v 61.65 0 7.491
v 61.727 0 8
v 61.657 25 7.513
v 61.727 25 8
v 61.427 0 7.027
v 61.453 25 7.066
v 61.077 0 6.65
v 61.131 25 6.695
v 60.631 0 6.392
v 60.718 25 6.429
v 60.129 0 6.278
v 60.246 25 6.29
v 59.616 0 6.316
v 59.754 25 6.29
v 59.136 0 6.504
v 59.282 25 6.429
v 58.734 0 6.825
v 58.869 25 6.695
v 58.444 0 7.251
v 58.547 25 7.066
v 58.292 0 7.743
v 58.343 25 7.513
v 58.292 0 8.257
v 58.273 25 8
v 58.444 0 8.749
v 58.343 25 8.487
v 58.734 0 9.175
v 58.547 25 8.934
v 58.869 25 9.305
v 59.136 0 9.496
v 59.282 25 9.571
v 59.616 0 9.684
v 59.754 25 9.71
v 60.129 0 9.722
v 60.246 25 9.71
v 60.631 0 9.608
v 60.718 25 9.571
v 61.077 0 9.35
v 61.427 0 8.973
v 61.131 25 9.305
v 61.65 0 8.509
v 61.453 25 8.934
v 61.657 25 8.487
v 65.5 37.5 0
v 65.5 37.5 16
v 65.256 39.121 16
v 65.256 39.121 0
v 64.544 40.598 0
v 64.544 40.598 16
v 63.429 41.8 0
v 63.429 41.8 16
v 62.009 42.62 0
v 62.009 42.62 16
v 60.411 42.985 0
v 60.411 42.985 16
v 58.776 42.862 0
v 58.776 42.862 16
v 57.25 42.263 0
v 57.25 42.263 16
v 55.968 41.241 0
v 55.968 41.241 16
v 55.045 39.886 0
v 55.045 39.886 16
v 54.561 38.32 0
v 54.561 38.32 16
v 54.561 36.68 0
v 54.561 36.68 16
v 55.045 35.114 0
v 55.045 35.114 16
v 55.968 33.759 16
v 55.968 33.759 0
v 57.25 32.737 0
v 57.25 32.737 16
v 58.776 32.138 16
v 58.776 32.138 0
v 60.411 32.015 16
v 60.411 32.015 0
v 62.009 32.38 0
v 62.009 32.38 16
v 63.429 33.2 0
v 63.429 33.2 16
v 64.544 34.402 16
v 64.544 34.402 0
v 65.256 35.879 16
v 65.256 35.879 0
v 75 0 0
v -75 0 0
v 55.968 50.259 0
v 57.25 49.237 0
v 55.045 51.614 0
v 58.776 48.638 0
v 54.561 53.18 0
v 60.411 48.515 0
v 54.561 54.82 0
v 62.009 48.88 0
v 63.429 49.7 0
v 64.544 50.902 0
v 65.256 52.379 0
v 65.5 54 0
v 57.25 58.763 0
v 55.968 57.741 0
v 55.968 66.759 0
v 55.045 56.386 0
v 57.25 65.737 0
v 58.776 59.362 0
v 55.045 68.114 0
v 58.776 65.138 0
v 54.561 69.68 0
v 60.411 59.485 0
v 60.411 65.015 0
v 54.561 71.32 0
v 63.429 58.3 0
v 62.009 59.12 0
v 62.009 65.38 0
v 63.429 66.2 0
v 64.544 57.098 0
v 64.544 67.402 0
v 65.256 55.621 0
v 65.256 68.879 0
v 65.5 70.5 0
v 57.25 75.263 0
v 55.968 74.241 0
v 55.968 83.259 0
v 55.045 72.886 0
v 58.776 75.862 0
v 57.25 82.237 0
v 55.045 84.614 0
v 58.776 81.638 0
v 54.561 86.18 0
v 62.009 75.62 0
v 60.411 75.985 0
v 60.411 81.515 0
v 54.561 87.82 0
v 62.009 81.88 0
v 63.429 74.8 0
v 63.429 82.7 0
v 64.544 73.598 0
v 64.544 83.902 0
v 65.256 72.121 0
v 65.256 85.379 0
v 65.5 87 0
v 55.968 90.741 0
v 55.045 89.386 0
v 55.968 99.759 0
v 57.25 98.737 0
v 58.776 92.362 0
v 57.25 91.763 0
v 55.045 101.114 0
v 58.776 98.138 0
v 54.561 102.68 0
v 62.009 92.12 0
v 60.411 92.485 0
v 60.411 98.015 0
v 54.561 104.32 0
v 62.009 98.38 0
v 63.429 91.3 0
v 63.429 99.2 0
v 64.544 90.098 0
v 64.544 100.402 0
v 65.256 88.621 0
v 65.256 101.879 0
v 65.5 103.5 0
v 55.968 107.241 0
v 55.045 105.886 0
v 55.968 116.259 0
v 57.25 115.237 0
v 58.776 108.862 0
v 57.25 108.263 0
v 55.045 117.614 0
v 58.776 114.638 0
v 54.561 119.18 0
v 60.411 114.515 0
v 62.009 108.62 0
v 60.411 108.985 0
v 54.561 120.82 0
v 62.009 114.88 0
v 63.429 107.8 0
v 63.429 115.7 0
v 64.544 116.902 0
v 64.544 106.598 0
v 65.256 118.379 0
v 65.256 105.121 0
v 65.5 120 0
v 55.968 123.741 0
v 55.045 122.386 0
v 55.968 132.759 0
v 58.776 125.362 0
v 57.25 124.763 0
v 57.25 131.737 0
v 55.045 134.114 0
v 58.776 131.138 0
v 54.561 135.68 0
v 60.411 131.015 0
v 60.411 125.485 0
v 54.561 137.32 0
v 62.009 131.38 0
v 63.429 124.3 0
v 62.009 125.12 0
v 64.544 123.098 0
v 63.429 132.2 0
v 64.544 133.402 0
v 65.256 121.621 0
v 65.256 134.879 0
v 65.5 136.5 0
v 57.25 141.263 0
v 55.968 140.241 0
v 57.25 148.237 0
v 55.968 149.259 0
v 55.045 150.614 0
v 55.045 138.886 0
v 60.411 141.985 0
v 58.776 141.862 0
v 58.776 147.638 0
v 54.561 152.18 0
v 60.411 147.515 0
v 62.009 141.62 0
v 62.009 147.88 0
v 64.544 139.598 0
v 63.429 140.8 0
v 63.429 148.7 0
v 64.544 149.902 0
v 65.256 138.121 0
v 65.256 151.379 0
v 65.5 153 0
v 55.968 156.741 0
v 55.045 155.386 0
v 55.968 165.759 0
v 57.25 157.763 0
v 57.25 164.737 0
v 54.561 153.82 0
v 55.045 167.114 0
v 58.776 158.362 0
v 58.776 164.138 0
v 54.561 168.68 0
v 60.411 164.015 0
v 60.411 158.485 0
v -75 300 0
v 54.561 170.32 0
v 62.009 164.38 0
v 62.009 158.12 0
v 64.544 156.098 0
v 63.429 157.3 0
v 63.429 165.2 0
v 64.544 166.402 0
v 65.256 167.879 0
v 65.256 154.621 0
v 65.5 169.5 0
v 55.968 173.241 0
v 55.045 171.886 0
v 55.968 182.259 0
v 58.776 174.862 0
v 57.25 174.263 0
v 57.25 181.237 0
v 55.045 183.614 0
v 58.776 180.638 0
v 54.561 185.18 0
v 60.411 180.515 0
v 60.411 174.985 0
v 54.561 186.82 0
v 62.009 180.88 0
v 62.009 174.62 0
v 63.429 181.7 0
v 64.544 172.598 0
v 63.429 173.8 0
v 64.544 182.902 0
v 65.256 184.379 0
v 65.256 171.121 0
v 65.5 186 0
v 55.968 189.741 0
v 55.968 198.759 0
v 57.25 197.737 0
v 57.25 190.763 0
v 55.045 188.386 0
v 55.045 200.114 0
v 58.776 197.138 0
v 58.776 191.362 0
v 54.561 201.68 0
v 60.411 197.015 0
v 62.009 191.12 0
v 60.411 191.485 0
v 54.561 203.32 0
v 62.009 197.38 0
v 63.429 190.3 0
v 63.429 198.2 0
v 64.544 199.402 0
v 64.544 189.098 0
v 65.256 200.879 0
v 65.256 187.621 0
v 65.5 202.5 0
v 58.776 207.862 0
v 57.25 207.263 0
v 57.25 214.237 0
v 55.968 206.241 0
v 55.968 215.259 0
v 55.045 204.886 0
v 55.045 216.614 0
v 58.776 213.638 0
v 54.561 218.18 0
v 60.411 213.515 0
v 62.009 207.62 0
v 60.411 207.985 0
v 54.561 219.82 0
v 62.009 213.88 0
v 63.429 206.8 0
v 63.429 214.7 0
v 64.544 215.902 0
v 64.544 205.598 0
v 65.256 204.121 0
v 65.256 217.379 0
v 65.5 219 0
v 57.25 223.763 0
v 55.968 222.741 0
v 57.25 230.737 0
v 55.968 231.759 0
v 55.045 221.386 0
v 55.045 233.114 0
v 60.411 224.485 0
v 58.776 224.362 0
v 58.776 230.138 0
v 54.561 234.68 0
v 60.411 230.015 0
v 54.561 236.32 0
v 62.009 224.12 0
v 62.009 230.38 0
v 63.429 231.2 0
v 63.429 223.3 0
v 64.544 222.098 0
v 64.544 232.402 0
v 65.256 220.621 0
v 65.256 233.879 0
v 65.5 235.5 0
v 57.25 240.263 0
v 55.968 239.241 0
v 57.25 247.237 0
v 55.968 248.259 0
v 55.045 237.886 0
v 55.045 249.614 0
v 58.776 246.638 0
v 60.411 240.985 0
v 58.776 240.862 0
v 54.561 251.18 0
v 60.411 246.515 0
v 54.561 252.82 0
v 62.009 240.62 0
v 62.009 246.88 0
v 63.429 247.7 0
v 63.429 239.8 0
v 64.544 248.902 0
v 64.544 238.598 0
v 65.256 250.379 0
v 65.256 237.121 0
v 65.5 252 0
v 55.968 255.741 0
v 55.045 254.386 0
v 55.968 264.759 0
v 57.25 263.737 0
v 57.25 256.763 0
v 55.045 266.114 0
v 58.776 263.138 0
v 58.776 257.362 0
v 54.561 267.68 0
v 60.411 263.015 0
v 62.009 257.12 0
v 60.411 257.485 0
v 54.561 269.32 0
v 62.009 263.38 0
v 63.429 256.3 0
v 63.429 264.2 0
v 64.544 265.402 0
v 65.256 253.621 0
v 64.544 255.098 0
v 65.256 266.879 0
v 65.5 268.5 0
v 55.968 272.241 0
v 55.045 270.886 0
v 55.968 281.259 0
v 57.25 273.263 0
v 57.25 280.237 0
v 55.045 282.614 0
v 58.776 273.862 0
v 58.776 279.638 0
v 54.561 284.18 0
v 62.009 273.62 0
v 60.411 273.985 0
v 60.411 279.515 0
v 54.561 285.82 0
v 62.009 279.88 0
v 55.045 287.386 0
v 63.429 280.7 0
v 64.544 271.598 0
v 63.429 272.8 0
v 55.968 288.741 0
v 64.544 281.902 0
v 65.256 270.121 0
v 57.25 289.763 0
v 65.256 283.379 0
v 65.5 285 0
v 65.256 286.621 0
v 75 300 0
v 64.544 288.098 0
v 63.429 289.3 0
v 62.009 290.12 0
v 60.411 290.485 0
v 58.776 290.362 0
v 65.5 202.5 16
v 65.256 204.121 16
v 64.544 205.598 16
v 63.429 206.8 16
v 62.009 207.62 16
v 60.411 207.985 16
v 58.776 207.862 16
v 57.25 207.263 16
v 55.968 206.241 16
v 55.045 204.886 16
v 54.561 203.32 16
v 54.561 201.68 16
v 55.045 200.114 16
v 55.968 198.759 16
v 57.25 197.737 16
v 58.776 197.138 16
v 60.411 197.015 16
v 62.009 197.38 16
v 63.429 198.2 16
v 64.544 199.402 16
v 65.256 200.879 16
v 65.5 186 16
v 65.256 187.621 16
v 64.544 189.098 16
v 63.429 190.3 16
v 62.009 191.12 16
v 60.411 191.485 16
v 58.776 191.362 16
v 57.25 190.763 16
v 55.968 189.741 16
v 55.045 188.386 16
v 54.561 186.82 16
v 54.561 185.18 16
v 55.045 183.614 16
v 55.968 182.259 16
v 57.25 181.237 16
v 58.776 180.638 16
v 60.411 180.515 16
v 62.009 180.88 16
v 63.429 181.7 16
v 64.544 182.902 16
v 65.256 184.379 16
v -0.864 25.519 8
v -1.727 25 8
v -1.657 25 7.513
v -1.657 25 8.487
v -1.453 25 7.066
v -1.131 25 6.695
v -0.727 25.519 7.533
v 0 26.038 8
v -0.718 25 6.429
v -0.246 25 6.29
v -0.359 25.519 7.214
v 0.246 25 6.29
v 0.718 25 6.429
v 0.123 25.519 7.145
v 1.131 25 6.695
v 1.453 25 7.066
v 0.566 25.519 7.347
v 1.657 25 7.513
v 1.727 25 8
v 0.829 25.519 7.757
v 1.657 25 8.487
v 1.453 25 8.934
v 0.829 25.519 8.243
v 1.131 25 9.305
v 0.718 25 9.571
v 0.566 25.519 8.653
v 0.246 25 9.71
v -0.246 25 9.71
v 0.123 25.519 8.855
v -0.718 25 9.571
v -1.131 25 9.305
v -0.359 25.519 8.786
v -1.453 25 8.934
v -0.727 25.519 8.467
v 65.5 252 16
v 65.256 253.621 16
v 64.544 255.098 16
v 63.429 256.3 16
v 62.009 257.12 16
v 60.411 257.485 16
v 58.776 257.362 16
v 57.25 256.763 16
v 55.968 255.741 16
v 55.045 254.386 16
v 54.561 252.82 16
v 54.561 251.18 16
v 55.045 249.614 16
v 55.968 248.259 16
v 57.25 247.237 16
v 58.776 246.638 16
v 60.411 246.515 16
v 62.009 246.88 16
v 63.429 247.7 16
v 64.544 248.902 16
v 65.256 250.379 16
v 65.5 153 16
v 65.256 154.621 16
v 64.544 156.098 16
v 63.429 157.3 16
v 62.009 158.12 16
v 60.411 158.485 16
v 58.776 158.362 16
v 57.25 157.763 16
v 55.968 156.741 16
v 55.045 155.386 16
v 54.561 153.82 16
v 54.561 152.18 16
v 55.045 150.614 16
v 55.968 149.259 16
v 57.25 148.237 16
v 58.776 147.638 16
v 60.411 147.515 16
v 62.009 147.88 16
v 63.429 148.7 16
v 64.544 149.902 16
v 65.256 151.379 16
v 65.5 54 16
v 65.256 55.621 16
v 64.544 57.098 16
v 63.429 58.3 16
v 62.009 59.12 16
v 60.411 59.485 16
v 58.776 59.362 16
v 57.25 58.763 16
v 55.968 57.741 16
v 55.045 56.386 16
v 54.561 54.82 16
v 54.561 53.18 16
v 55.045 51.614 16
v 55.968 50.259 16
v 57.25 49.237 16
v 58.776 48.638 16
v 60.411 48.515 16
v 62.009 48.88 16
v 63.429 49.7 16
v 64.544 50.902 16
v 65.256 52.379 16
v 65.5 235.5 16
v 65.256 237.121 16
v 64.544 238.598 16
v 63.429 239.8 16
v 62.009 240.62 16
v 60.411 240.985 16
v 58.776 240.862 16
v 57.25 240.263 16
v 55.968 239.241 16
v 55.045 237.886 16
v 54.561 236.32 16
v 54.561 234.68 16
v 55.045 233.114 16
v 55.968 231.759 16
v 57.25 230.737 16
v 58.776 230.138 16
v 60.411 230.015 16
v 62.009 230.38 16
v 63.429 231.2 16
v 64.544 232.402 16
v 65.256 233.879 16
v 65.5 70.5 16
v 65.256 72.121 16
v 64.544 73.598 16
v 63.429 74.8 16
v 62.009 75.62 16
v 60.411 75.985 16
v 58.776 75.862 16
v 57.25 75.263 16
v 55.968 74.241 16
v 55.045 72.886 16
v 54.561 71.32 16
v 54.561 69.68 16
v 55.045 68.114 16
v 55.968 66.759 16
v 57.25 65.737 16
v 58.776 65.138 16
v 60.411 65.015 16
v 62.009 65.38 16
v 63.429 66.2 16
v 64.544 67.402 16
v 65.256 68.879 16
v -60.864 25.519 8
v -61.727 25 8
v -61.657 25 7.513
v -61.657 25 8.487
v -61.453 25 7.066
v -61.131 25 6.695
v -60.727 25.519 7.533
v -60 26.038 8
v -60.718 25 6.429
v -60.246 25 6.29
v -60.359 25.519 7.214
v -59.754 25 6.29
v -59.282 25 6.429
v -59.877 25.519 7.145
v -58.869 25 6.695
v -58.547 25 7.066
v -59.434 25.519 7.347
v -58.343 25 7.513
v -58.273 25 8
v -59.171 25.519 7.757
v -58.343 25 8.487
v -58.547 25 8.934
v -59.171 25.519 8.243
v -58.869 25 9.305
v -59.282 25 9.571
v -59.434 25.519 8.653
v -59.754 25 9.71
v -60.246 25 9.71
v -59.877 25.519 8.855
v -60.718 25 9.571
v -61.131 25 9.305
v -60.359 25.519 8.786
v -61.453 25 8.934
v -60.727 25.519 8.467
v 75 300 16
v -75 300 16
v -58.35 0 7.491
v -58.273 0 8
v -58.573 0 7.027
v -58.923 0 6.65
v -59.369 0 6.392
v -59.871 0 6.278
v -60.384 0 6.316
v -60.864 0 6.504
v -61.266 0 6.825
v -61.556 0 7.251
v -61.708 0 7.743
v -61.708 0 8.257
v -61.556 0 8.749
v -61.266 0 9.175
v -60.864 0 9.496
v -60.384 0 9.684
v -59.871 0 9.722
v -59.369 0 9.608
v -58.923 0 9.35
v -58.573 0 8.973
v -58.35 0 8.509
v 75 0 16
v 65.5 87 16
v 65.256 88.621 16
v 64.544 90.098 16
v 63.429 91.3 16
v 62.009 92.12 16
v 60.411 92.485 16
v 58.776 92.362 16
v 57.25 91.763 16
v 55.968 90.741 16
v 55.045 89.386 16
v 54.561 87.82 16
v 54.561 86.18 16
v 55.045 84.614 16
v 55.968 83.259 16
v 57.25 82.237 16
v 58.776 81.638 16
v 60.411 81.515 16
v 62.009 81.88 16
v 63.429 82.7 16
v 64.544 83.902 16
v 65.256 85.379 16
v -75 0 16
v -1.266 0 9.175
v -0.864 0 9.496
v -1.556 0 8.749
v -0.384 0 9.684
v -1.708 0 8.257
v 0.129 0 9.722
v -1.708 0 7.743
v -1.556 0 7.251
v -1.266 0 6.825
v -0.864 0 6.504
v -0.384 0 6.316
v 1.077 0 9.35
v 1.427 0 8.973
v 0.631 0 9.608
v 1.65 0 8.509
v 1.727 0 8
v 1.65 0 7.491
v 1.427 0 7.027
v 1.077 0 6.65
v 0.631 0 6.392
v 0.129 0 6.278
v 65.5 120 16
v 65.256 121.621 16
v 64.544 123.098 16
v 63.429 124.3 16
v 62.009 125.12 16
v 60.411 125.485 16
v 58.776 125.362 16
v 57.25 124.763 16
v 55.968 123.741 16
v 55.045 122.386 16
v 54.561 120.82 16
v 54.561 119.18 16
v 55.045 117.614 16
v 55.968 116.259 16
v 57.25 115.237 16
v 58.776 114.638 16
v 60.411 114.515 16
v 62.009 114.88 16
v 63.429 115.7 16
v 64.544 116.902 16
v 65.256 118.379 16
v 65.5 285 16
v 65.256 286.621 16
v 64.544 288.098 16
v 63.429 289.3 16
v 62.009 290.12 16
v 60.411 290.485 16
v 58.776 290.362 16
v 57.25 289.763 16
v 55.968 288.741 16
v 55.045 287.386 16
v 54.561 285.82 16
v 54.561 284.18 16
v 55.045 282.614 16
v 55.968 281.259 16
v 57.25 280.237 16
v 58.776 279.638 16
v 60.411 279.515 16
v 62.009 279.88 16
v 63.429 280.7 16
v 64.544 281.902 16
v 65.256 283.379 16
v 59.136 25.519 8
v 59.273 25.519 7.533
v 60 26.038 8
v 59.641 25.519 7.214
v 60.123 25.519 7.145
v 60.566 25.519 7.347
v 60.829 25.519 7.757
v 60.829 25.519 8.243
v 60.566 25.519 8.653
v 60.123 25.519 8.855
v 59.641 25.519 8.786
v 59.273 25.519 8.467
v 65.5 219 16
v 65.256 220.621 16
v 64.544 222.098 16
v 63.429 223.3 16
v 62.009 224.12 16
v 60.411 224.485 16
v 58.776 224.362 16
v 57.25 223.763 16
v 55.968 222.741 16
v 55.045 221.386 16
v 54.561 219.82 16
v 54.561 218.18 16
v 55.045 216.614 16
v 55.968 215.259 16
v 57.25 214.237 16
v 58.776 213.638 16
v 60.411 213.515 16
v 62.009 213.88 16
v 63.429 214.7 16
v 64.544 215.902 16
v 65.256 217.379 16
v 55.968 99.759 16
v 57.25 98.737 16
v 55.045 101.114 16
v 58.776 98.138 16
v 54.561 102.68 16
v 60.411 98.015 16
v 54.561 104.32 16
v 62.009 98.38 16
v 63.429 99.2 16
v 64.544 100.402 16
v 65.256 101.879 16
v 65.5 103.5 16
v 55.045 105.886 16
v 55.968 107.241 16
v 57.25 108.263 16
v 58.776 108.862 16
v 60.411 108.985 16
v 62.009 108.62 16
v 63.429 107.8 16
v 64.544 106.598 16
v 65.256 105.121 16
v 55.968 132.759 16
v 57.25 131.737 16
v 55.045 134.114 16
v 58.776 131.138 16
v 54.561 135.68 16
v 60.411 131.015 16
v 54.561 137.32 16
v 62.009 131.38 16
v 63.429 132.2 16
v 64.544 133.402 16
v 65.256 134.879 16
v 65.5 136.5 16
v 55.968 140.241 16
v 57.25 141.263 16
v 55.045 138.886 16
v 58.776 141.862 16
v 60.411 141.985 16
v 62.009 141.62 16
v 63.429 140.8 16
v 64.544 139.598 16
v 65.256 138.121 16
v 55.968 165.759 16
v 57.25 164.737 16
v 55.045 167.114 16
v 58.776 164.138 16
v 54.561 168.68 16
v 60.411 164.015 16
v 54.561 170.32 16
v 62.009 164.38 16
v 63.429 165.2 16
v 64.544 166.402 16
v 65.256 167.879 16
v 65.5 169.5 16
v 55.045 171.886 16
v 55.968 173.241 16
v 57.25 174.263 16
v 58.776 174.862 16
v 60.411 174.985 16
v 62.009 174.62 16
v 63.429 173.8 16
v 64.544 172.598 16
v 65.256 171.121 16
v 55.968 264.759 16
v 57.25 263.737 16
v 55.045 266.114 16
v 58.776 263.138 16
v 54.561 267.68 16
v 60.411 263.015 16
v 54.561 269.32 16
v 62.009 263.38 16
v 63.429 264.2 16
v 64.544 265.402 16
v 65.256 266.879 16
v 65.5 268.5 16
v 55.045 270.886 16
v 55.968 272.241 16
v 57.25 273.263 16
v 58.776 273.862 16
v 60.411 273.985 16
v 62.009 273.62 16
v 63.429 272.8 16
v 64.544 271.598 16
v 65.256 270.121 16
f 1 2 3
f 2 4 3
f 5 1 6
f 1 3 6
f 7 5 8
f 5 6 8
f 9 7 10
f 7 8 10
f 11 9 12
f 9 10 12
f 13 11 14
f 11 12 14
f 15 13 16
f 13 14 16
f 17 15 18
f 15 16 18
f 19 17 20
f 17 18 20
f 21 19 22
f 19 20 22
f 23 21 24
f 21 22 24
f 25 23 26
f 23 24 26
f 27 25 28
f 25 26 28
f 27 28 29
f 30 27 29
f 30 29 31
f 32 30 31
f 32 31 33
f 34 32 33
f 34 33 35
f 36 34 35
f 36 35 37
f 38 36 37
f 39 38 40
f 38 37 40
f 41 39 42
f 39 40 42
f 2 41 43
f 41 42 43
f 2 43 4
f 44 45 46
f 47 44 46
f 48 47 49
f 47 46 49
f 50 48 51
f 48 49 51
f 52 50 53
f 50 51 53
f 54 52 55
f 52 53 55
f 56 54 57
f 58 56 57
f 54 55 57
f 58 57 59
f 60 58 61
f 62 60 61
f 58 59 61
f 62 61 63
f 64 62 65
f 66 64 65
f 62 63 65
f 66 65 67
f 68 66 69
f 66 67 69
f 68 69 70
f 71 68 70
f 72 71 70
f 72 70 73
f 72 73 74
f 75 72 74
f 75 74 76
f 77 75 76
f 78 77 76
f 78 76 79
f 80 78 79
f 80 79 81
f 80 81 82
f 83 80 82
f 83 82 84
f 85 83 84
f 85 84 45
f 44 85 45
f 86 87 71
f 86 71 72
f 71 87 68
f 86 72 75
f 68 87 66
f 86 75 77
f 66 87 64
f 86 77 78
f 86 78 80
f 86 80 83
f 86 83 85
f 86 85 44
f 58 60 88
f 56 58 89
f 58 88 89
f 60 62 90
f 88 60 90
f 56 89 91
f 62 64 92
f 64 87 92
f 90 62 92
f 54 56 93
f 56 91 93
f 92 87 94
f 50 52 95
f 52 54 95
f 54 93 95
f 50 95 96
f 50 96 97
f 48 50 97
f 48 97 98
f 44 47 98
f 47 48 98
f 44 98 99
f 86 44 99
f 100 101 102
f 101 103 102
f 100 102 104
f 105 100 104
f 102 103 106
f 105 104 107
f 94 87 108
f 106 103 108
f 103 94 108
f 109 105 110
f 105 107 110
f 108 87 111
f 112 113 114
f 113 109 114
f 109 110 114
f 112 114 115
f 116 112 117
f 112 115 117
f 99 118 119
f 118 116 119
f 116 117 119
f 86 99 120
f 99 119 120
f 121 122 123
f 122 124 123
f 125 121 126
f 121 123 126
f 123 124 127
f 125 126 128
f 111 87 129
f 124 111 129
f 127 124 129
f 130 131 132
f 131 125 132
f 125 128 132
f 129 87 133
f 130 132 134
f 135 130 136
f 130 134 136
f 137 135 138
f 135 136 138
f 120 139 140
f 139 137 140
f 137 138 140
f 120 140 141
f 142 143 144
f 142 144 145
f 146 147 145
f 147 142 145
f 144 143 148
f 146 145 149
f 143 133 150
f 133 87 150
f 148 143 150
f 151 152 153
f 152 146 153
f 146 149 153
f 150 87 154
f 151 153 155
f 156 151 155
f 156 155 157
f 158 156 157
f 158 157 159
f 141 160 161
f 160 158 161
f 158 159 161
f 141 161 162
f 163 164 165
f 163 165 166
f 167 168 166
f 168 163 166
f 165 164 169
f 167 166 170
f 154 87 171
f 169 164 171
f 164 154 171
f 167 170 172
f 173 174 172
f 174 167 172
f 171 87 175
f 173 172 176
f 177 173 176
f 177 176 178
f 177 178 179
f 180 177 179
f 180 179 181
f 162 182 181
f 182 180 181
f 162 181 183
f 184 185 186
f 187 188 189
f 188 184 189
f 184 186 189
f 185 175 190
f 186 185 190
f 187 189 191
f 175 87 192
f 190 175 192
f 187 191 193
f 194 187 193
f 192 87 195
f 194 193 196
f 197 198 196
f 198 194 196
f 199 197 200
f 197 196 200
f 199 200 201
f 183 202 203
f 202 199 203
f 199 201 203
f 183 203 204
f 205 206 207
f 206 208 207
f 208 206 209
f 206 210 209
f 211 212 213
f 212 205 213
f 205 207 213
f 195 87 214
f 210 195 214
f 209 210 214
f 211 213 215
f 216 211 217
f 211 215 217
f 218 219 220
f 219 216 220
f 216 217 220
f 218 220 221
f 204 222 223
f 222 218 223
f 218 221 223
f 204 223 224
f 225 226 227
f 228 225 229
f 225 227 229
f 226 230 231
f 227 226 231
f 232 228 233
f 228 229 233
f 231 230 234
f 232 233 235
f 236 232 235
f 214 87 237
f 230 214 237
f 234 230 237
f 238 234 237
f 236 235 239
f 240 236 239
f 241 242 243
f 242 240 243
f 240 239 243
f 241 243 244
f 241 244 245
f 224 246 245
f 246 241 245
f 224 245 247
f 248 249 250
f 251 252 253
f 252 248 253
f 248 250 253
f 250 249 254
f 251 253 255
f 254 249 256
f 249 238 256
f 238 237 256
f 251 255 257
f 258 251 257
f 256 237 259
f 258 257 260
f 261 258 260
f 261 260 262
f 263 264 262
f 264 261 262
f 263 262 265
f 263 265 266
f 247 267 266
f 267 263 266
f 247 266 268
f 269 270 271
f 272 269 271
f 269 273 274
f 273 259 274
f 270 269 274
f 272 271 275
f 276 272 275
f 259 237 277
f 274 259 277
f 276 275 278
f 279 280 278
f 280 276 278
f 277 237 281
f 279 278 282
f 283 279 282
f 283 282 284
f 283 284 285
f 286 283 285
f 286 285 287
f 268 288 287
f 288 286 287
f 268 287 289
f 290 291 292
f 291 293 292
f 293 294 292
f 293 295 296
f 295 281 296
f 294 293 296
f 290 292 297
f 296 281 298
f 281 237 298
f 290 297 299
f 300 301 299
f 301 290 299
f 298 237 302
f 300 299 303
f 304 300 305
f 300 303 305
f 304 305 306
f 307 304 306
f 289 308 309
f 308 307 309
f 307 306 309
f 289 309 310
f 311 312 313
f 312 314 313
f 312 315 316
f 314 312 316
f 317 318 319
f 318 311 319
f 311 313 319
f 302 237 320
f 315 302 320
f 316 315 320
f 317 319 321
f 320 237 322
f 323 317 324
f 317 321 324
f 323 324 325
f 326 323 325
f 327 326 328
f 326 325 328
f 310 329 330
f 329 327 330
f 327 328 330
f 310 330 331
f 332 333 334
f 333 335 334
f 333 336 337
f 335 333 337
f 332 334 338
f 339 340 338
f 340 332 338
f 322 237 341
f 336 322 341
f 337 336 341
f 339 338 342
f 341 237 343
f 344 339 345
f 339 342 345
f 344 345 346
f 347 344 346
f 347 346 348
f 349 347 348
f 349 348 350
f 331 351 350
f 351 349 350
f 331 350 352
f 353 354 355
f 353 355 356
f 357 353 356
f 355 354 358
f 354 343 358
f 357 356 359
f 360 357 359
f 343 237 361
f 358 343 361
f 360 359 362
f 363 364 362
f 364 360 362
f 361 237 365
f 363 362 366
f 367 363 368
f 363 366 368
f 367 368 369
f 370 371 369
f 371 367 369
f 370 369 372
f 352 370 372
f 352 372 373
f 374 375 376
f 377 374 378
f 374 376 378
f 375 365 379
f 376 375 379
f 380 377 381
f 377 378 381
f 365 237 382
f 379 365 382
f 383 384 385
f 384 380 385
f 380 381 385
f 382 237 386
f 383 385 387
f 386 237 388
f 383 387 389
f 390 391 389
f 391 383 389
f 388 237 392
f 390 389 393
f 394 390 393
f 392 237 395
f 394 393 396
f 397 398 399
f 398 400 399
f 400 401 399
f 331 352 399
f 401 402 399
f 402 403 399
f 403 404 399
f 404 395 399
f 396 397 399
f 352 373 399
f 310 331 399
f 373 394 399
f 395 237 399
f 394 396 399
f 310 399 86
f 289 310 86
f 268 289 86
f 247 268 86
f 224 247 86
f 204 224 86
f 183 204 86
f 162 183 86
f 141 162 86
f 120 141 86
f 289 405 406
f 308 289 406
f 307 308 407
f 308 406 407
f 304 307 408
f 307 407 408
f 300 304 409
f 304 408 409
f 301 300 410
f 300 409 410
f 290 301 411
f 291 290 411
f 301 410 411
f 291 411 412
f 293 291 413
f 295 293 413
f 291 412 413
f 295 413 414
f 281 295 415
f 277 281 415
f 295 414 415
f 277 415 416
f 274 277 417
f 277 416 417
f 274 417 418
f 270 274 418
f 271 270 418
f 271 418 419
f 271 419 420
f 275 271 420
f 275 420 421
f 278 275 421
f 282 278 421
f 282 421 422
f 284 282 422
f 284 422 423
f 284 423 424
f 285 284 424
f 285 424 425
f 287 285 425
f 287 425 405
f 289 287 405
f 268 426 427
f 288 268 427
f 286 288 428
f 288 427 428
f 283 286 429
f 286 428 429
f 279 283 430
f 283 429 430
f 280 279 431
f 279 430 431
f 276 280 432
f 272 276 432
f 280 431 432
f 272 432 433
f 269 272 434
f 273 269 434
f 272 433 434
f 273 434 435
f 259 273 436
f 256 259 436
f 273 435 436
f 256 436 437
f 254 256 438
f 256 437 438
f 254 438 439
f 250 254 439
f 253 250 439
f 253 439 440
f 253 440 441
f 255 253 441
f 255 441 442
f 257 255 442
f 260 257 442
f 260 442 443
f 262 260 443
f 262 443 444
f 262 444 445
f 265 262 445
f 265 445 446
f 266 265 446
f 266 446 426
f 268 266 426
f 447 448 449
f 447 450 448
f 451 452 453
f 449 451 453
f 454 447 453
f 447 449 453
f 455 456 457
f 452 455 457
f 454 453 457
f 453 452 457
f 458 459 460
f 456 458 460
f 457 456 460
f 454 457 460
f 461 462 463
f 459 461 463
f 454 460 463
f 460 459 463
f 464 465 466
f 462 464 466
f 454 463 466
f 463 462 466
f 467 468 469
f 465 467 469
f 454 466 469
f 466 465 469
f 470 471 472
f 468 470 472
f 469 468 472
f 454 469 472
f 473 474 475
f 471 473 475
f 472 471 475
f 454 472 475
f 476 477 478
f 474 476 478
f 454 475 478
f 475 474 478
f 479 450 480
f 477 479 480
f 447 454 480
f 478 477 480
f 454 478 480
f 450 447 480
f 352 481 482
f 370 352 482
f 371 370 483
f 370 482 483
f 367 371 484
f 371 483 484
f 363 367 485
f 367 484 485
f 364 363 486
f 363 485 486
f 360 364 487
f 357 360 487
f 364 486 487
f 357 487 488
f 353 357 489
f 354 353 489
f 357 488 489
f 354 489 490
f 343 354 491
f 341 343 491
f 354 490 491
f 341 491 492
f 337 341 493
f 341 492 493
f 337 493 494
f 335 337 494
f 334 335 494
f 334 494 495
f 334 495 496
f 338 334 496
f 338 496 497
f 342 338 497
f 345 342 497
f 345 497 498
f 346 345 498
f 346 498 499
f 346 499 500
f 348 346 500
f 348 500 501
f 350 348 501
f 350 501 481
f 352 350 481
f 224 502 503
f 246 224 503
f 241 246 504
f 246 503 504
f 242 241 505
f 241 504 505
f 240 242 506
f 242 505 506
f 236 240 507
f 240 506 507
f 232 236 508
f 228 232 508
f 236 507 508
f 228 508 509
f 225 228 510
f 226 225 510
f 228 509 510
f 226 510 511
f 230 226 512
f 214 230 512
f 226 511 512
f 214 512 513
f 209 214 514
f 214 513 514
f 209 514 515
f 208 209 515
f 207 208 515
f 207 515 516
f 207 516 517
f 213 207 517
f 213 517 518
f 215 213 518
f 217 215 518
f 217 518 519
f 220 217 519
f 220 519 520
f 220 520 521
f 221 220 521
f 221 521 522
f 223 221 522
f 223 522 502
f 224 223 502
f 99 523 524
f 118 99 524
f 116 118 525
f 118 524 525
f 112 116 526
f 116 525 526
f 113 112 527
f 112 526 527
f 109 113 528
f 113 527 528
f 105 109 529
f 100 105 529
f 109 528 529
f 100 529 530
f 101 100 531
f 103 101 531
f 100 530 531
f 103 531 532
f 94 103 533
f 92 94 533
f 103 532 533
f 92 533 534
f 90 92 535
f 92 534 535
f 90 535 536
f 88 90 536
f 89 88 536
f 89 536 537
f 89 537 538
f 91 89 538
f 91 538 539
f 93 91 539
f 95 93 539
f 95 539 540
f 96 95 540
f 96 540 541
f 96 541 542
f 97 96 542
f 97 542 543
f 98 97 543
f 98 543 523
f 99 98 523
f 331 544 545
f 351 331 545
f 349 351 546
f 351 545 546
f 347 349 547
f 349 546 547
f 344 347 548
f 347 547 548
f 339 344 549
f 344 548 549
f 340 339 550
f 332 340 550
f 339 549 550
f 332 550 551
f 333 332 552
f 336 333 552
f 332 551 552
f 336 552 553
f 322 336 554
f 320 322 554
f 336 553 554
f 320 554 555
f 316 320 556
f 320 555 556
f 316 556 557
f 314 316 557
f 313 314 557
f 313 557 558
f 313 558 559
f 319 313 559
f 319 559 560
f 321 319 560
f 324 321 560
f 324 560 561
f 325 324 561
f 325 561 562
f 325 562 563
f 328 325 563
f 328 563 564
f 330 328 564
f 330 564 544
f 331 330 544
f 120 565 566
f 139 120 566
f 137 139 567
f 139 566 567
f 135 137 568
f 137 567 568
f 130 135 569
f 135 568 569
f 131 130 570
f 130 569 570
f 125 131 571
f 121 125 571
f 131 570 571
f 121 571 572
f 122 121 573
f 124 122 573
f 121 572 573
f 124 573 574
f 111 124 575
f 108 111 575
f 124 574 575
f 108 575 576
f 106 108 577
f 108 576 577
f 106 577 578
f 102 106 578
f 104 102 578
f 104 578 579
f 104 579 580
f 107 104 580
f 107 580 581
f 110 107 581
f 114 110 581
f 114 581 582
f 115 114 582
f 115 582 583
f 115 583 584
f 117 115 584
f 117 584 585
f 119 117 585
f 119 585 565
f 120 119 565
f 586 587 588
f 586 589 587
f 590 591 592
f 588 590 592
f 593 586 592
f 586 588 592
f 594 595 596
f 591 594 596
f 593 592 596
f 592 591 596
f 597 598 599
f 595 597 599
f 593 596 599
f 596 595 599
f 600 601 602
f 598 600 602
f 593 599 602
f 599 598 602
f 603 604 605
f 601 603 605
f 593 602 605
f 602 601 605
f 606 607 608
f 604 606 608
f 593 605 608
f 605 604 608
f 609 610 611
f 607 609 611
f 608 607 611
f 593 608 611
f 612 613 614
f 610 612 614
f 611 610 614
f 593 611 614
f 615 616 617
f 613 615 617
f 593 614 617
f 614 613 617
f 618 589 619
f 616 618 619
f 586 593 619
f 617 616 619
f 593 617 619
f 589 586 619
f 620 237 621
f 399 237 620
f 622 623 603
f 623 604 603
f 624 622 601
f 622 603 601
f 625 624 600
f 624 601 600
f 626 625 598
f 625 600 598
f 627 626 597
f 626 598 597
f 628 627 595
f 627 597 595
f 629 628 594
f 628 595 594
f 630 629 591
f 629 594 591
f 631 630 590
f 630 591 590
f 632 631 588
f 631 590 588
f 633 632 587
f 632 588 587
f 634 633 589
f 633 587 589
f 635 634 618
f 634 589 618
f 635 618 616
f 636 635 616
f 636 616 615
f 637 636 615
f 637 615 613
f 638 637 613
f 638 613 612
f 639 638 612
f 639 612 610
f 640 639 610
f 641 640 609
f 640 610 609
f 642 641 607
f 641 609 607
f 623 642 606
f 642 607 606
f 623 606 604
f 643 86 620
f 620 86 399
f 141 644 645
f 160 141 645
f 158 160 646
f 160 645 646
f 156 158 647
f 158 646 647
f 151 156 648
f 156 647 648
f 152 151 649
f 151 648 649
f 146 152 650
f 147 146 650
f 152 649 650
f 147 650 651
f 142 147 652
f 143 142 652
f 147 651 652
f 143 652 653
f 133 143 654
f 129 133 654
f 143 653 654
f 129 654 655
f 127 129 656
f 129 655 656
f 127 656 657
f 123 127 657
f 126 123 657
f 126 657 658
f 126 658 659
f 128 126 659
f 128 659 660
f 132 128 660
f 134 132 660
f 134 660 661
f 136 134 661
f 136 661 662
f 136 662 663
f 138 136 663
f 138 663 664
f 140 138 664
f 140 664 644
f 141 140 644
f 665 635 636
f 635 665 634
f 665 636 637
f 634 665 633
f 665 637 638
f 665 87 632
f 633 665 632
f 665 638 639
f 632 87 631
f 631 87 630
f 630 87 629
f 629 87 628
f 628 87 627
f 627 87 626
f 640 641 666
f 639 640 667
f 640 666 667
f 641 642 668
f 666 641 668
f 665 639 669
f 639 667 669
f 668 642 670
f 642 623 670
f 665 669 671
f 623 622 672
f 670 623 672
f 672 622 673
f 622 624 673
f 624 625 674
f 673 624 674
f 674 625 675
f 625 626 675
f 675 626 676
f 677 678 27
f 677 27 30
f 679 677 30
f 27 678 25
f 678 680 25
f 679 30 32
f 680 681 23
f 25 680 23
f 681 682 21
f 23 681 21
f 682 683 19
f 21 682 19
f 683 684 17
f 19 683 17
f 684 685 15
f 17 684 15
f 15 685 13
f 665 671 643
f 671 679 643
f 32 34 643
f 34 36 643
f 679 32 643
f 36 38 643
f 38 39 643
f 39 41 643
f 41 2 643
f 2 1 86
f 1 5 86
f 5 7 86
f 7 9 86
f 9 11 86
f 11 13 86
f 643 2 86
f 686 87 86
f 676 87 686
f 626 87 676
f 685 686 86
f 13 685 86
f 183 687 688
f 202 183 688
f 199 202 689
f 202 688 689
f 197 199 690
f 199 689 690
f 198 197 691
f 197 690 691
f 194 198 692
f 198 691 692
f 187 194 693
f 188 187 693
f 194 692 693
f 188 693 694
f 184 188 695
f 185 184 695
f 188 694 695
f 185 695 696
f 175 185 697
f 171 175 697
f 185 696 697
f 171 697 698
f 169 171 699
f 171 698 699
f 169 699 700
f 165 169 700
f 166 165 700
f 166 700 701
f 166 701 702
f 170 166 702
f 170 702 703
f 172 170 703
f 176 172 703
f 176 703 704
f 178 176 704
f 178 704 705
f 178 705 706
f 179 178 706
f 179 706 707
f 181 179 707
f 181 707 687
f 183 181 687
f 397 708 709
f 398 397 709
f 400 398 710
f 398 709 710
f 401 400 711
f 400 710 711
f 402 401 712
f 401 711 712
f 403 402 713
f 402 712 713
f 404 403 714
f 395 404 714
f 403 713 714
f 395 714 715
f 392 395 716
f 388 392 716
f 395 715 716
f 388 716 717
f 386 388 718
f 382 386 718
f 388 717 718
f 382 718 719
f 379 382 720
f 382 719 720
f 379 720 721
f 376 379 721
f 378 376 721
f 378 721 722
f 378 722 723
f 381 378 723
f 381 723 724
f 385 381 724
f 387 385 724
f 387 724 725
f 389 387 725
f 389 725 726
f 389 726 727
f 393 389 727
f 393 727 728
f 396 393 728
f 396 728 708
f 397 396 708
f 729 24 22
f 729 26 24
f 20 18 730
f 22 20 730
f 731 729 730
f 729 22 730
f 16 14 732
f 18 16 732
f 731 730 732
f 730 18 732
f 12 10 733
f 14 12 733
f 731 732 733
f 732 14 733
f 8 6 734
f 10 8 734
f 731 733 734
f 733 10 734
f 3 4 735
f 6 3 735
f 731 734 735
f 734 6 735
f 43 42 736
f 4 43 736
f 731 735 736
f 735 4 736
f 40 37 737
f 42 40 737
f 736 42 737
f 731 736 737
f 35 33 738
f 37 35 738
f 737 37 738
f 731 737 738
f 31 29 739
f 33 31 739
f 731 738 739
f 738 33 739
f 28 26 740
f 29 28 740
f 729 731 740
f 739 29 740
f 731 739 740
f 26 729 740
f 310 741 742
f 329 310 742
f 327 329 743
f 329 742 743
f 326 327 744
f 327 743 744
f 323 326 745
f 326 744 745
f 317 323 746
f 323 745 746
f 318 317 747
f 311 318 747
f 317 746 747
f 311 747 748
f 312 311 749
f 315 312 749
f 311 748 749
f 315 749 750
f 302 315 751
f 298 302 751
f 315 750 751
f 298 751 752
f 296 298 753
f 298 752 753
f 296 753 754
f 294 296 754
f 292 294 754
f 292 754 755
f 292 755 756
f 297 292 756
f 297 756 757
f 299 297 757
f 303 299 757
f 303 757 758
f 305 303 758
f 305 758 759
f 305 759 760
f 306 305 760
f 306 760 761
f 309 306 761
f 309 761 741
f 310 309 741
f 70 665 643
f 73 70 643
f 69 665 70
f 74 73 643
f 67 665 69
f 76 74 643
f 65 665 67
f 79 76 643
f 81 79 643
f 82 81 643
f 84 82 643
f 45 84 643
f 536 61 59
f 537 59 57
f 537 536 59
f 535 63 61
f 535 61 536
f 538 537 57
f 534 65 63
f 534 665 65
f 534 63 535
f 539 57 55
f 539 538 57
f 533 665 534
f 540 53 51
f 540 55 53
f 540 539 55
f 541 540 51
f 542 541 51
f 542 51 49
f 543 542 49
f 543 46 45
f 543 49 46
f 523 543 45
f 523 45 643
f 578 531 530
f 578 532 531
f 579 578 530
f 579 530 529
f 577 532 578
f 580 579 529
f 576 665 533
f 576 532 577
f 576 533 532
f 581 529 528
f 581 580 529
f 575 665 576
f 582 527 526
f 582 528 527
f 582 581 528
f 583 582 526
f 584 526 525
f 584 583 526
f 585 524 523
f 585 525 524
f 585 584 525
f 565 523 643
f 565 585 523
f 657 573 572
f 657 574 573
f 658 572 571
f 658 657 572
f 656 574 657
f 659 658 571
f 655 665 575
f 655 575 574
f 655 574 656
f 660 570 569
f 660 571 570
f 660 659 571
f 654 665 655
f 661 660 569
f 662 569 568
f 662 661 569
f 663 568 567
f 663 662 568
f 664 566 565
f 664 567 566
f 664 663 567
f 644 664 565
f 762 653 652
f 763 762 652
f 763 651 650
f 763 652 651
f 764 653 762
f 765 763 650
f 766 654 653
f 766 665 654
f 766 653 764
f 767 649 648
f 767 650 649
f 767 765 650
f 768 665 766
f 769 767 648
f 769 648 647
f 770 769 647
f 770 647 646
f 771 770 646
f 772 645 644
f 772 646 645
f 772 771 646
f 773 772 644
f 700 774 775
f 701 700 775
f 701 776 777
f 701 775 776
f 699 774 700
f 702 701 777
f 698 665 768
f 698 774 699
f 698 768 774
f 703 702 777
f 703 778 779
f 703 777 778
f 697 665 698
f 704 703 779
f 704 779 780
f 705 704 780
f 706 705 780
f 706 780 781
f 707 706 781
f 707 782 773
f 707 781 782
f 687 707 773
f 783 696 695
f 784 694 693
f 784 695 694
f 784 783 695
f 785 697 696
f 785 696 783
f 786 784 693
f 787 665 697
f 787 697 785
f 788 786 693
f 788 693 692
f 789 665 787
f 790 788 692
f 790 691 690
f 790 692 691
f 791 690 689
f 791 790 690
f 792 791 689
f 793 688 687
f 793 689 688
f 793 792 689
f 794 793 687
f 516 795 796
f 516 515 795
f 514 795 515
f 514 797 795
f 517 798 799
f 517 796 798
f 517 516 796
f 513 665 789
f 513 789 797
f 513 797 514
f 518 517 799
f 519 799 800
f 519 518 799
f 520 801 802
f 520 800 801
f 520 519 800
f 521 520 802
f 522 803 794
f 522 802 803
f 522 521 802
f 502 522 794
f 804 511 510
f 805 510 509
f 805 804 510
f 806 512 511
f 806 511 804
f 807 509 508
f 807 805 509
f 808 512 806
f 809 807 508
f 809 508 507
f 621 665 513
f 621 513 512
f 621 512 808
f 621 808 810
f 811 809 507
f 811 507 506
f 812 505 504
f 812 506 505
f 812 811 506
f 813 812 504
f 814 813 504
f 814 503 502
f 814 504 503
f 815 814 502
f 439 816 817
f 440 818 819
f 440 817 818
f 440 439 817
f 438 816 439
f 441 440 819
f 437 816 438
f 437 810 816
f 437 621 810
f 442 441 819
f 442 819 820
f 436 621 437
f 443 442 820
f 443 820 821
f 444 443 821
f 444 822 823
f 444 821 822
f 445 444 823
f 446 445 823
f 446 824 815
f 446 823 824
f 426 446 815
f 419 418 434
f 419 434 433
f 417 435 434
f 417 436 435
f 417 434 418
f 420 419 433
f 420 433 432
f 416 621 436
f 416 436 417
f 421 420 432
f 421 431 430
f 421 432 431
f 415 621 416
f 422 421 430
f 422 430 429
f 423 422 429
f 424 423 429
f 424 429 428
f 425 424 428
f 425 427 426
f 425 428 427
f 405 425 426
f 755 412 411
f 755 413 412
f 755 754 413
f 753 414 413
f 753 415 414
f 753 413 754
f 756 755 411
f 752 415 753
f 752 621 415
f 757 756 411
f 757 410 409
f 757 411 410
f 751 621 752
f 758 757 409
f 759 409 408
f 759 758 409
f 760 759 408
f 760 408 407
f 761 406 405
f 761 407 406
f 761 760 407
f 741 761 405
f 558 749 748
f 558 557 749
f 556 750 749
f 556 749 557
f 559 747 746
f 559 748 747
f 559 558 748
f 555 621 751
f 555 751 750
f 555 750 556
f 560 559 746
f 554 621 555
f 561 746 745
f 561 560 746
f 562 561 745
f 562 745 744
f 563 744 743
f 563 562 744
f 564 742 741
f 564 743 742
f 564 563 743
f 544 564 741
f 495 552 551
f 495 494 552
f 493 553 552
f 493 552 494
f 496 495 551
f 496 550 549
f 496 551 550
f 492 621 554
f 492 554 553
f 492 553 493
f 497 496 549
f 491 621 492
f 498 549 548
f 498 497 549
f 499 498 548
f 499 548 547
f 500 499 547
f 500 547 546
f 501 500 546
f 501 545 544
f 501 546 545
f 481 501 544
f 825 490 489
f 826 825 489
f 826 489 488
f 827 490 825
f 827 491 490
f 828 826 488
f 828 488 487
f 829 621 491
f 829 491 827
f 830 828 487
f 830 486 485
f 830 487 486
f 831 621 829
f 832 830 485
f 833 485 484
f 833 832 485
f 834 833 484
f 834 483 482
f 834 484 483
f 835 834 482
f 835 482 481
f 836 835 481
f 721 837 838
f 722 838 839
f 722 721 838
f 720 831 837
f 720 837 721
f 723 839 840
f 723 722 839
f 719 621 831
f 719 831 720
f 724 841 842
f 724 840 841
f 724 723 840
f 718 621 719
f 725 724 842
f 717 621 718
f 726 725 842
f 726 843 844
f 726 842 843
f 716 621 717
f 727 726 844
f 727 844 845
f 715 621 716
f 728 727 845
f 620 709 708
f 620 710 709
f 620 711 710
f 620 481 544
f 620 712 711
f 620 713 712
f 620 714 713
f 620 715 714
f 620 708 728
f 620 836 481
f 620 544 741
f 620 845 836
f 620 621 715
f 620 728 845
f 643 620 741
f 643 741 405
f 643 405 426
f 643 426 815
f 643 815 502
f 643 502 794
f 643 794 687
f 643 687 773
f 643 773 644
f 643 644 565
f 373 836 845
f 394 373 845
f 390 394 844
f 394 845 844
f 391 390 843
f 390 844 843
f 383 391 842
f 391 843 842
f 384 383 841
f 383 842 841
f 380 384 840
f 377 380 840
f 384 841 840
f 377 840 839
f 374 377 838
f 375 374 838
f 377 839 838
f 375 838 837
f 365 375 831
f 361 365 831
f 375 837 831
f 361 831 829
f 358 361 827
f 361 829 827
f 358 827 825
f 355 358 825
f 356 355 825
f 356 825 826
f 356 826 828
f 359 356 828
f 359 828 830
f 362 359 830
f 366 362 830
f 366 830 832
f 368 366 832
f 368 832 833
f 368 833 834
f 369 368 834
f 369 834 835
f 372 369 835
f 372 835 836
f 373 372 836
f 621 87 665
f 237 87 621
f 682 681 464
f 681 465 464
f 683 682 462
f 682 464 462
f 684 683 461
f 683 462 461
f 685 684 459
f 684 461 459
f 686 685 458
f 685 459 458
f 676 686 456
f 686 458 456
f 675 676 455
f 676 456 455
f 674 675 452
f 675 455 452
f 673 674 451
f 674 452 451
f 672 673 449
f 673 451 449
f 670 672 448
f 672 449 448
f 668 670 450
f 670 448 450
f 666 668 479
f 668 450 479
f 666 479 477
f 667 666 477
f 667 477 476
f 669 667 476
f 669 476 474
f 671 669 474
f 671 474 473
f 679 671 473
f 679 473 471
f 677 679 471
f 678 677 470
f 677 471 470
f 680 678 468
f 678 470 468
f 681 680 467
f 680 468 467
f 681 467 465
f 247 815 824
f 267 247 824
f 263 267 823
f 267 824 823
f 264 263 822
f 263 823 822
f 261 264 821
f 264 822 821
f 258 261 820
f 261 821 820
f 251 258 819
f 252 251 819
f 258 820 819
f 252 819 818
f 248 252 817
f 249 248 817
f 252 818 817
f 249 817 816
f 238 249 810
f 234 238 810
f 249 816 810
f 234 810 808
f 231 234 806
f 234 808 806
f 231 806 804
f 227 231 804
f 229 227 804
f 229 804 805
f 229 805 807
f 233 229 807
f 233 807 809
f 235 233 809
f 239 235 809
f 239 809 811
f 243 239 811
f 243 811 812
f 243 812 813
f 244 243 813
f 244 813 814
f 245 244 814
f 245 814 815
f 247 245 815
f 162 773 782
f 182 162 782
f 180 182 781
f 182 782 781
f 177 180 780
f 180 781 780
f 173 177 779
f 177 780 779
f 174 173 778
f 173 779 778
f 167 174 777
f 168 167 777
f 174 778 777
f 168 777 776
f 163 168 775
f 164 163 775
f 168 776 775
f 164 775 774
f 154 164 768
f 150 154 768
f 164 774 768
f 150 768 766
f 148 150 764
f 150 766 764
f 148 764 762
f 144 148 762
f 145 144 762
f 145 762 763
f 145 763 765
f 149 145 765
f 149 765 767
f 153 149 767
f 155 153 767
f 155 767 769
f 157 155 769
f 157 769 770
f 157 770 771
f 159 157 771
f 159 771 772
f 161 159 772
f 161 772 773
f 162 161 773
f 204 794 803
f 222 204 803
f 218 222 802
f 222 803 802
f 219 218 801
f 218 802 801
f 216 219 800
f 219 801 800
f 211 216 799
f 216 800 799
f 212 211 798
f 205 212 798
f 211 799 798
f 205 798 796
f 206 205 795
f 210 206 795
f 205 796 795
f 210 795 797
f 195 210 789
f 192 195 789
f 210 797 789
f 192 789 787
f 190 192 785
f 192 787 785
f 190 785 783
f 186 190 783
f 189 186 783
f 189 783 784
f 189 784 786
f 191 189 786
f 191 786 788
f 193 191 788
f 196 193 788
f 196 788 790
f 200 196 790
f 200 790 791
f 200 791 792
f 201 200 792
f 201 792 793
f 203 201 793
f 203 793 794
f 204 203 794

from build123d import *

# Parameters (mm, degrees)
SKETCH1_W                 = 150
SKETCH1_H                 = 300
BOSS_EXTRUDE1_DEPTH       = 16
SKETCH2_R                 = 5.5
CUT_EXTRUDE4_DEPTH        = 310.646572724
LPATTERN1_COUNT           = 16
LPATTERN1_PITCH           = 16.5
F_8_36_TAPPED_HOLE1_D     = 3.4544
F_8_36_TAPPED_HOLE1_DEPTH = 25
F_8_36_TAPPED_HOLE1_TIP   = 1.037806461


with BuildPart() as part:
    # Sketch1 → Boss-Extrude1 (new body)
    with BuildSketch(Plane.XY):
        with Locations((0, 150)):
            Rectangle(SKETCH1_W, SKETCH1_H)
    extrude(amount=BOSS_EXTRUDE1_DEPTH)

    # Sketch2 → Cut-Extrude4 (cut, through all)
    with BuildSketch(Plane.XY.offset(16)):
        with Locations((60, 37.5)):
            Circle(SKETCH2_R)
    cut_extrude4 = extrude(amount=-CUT_EXTRUDE4_DEPTH, mode=Mode.SUBTRACT)

    # LPattern1: Cut-Extrude4 ×16
    with Locations(*[(0, i * LPATTERN1_PITCH, 0) for i in range(1, LPATTERN1_COUNT)]):
        add(cut_extrude4, mode=Mode.SUBTRACT)

    # #8-36 Tapped Hole1
    with Locations(Plane(origin=(0, 0, 0), x_dir=(-1, 0, 0), z_dir=(0, -1, 0))):
        with Locations((-60, -8), (0, -8), (60, -8)):
            Hole(F_8_36_TAPPED_HOLE1_D / 2, depth=F_8_36_TAPPED_HOLE1_DEPTH)
            with Locations((0, 0, -(F_8_36_TAPPED_HOLE1_DEPTH + F_8_36_TAPPED_HOLE1_TIP / 2))):  # 118° drill point
                Cone(0, F_8_36_TAPPED_HOLE1_D / 2, F_8_36_TAPPED_HOLE1_TIP, mode=Mode.SUBTRACT)


solid = part.part
